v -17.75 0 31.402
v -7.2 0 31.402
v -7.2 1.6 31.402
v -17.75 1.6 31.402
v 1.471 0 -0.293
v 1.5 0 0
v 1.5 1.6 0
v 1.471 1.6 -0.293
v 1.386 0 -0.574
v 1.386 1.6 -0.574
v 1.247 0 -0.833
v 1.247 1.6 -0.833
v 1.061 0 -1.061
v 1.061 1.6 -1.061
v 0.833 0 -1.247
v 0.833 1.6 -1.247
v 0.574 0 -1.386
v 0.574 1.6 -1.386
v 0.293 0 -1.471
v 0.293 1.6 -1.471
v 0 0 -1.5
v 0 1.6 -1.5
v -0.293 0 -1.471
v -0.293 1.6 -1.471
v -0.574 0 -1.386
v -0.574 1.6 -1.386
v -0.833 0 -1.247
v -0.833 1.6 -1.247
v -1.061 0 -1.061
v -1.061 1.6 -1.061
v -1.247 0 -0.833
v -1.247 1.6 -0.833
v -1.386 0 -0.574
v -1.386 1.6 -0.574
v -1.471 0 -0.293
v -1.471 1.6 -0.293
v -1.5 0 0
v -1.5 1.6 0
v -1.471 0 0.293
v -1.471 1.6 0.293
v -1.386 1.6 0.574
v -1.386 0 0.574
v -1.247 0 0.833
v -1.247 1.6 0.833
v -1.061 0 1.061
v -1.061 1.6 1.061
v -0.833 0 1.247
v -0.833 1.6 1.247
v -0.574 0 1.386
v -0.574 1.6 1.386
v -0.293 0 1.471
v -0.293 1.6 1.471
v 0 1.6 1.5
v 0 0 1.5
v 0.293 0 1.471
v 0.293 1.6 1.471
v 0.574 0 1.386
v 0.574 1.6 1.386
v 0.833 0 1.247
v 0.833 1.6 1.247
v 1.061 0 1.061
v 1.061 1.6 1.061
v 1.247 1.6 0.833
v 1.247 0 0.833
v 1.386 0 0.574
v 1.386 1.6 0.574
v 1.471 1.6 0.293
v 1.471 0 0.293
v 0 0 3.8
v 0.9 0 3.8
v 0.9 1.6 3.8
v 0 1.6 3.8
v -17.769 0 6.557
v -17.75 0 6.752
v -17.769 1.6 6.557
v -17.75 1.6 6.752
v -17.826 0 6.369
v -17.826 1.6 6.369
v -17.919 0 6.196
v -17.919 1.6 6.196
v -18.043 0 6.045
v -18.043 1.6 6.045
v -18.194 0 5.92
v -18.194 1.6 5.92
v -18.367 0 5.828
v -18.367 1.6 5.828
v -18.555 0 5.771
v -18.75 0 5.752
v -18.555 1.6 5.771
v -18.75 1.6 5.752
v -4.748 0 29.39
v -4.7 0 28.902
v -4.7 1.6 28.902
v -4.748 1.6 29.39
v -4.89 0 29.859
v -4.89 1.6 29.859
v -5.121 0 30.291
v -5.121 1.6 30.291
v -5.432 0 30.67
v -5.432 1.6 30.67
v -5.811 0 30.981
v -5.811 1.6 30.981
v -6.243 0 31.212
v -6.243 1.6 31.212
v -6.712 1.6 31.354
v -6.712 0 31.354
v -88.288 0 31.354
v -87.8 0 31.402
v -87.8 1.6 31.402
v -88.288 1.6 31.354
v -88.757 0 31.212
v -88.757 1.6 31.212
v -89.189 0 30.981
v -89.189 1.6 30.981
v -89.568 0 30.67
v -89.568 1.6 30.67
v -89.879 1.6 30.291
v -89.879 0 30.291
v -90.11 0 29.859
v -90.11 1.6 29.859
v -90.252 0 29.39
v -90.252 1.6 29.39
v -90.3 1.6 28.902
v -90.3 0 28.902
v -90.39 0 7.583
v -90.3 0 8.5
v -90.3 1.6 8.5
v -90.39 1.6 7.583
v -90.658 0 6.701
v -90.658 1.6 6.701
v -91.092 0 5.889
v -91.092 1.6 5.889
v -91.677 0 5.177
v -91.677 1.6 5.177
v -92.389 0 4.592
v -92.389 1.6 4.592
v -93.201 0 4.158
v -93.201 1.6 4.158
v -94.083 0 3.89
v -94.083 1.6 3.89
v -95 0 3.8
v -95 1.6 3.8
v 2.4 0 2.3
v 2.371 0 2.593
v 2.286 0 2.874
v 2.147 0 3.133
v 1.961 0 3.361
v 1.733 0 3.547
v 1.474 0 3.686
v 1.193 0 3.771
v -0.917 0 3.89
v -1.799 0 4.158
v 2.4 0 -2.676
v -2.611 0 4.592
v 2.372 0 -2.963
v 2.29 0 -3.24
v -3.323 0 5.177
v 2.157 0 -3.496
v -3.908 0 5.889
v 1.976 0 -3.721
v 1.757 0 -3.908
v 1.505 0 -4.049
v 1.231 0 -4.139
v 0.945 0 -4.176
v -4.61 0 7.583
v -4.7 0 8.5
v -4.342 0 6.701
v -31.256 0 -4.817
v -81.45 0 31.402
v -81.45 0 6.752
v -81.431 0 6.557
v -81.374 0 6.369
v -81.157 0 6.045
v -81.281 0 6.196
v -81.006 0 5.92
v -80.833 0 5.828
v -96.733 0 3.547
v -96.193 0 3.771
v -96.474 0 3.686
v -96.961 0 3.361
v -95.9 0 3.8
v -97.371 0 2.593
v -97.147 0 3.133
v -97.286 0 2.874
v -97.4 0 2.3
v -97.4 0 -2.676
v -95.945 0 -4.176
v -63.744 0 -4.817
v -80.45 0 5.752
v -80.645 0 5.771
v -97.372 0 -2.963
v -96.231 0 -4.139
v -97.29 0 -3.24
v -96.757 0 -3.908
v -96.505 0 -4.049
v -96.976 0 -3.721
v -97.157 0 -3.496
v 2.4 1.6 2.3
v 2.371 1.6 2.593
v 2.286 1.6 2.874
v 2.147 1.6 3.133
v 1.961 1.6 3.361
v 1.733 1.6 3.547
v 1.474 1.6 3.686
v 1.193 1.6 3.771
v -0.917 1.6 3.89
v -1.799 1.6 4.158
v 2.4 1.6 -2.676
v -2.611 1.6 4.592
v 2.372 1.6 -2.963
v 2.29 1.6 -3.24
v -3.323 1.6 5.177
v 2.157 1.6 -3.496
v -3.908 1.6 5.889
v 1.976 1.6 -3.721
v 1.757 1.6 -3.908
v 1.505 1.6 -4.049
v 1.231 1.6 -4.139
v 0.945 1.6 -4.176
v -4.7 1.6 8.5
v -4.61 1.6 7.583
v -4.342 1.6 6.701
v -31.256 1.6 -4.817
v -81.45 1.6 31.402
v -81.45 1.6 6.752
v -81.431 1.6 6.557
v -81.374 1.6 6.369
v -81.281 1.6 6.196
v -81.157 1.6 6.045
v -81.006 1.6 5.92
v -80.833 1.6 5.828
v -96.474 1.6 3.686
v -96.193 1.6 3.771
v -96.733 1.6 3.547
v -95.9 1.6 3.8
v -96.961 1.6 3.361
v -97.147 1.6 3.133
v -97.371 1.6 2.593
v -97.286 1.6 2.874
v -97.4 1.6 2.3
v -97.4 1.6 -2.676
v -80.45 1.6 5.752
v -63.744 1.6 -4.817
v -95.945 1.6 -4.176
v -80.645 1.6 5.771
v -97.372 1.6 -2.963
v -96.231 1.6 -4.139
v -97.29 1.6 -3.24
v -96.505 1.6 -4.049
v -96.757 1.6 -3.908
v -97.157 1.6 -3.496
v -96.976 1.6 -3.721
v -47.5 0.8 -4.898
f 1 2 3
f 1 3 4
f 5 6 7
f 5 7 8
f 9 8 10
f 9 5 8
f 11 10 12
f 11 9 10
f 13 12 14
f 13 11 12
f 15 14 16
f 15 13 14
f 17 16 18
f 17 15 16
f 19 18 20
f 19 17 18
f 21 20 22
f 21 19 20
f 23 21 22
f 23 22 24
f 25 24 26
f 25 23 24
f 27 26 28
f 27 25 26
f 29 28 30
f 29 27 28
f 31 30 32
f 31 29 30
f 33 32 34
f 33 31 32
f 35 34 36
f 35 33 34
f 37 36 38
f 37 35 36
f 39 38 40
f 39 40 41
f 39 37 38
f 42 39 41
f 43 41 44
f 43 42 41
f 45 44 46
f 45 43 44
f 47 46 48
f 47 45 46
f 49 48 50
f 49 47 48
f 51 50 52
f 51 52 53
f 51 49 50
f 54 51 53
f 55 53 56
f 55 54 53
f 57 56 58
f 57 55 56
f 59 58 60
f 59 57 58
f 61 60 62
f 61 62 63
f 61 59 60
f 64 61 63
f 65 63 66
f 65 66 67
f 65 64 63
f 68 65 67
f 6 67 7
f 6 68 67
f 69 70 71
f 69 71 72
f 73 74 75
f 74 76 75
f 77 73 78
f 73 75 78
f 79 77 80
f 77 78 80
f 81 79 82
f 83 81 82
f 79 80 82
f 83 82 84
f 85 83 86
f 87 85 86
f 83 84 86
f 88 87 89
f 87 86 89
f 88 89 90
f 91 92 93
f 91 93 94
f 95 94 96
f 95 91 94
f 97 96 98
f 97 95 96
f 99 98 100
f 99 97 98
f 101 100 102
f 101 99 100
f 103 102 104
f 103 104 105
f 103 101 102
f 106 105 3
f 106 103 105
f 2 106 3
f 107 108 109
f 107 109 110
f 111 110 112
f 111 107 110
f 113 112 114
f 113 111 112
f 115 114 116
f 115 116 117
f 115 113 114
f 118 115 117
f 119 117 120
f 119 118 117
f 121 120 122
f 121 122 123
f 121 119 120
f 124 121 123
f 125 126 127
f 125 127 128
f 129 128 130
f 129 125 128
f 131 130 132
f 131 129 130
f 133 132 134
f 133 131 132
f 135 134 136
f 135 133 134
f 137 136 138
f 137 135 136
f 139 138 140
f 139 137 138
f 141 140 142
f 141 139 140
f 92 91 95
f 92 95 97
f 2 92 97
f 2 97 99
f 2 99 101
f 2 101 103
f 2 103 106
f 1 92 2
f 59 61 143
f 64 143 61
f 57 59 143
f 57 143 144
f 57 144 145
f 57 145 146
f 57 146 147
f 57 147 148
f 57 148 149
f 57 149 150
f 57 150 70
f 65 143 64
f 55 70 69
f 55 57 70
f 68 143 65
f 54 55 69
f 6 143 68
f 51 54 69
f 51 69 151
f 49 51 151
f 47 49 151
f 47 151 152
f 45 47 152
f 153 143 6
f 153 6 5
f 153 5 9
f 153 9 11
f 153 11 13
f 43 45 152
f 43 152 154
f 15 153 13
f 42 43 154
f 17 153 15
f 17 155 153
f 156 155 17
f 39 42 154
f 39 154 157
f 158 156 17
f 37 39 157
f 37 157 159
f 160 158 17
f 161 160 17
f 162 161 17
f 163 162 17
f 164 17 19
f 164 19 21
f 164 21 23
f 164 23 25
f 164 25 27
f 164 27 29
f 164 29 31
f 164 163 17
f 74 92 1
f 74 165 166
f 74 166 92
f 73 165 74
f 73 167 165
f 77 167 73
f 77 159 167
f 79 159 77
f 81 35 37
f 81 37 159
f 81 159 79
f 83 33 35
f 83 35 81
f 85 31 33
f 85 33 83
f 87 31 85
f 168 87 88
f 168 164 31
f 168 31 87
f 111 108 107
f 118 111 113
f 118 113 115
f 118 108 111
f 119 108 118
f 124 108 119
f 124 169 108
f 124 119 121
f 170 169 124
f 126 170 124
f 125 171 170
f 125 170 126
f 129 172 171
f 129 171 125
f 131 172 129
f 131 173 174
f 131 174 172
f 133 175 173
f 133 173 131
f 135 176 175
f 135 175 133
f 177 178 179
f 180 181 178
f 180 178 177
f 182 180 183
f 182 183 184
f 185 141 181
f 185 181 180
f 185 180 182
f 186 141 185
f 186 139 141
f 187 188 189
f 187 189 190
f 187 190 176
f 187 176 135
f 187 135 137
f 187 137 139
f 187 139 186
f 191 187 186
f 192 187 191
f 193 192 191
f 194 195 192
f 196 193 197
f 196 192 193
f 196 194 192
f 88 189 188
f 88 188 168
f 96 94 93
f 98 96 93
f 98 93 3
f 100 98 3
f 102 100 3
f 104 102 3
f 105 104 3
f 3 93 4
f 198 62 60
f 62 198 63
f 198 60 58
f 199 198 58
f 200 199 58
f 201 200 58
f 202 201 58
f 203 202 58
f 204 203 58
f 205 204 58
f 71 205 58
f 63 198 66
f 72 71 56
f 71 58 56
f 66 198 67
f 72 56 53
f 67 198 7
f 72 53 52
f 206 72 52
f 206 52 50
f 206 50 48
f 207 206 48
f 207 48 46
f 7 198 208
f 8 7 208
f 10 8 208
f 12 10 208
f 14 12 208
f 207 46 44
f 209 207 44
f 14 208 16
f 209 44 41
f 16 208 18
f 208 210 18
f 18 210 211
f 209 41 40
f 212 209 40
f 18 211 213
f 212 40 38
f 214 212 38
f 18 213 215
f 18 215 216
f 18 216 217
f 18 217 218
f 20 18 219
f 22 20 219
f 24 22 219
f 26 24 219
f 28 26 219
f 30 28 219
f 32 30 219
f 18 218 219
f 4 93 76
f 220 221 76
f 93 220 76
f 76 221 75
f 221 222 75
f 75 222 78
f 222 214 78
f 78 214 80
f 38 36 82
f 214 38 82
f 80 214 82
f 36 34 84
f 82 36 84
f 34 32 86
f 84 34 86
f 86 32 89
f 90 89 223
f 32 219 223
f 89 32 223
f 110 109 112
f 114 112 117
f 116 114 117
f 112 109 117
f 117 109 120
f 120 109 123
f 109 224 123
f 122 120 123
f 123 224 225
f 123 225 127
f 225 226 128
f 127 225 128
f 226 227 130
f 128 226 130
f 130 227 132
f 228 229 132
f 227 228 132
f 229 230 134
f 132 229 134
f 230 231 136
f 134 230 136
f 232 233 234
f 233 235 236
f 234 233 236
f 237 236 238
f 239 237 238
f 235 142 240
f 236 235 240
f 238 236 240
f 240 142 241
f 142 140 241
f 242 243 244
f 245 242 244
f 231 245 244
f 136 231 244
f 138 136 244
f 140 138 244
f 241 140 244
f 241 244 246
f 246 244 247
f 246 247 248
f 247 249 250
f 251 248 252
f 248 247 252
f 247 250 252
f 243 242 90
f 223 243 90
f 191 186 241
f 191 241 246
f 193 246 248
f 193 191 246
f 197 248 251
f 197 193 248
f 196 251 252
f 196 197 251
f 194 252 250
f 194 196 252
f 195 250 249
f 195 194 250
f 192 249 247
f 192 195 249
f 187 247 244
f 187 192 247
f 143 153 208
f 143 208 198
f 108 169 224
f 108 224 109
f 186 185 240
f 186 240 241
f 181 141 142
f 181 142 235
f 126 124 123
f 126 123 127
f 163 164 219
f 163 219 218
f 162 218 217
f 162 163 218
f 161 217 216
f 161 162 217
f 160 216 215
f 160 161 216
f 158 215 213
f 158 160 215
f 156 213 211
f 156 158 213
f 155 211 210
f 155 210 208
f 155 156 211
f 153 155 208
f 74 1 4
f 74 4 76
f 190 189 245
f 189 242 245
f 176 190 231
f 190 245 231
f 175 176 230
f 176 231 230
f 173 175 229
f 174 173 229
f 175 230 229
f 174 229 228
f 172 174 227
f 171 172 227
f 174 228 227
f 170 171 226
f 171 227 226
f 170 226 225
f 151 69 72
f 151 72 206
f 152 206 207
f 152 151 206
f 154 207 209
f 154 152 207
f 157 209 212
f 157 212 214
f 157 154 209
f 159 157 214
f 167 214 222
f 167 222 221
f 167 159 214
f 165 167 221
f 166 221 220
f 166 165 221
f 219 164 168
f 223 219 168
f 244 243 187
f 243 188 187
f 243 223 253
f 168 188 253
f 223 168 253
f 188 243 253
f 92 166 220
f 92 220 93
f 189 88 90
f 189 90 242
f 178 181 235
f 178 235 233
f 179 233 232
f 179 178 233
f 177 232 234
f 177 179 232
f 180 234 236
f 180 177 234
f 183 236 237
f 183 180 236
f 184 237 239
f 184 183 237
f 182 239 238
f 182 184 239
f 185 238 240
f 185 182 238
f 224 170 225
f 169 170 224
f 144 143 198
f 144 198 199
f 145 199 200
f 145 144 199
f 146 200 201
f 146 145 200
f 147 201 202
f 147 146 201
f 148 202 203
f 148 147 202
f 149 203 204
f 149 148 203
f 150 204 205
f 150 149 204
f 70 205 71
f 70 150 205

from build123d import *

# Parameters (mm, degrees)
SKETCH1_R           = 1.5
BOSS_EXTRUDE1_DEPTH = 1.6
FILLET1_R           = 1


with BuildPart() as part:
    # Sketch1 → Boss-Extrude1 (new body)
    with BuildSketch(Plane(origin=(0, 0, 0), x_dir=(1, 0, 0), z_dir=(0, 1, 0))):
        with BuildLine():
            Line((0.9, -3.8), (0, -3.8))
            ThreePointArc((0, -3.8), (-3.323401872, -5.176598128), (-4.7, -8.5))
            Line((-4.7, -8.5), (-4.7, -28.901853444))
            ThreePointArc((-4.7, -28.901853444), (-5.432233047, -30.669620397), (-7.2, -31.401853444))
            Line((-7.2, -31.401853444), (-17.75, -31.401853444))
            Line((-17.75, -31.401853444), (-17.75, -5.751853444))
            Line((-17.75, -5.751853444), (-81.45, -5.751853444))
            Line((-81.45, -5.751853444), (-81.45, -31.401853444))
            Line((-81.45, -31.401853444), (-87.8, -31.401853444))
            ThreePointArc((-87.8, -31.401853444), (-89.567766953, -30.669620397), (-90.3, -28.901853444))
            Line((-90.3, -28.901853444), (-90.3, -8.5))
            ThreePointArc((-90.3, -8.5), (-91.676598128, -5.176598128), (-95, -3.8))
            Line((-95, -3.8), (-95.9, -3.8))
            ThreePointArc((-95.9, -3.8), (-96.960660172, -3.360660172), (-97.4, -2.3))
            Line((-97.4, -2.3), (-97.4, 2.67635027))
            ThreePointArc((-97.4, 2.67635027), (-96.976459398, 3.720972291), (-95.94501978, 4.175674525))
            add(Edge.make_bspline(
                [(0.94501978, 4.175674525), (-47.5, 5.630319254), (-95.94501978, 4.175674525)],
                knots=[4.549425728, 4.549425728, 4.549425728, 4.875352233, 4.875352233, 4.875352233], degree=2, weights=[1, 0.98675085, 1]))
            ThreePointArc((0.94501978, 4.175674525), (1.976459398, 3.720972291), (2.4, 2.67635027))
            Line((2.4, 2.67635027), (2.4, -2.3))
            ThreePointArc((2.4, -2.3), (1.960660172, -3.360660172), (0.9, -3.8))
        make_face()
        Circle(SKETCH1_R, mode=Mode.SUBTRACT)
    extrude(amount=BOSS_EXTRUDE1_DEPTH)

    # Fillet1
    fillet1_edges = [part.edges().sort_by_distance(p)[0] for p in [
        (-17.75, 0.8, 5.751853444),
        (-81.45, 0.8, 5.751853444),
    ]]
    fillet(fillet1_edges, radius=FILLET1_R)


solid = part.part
